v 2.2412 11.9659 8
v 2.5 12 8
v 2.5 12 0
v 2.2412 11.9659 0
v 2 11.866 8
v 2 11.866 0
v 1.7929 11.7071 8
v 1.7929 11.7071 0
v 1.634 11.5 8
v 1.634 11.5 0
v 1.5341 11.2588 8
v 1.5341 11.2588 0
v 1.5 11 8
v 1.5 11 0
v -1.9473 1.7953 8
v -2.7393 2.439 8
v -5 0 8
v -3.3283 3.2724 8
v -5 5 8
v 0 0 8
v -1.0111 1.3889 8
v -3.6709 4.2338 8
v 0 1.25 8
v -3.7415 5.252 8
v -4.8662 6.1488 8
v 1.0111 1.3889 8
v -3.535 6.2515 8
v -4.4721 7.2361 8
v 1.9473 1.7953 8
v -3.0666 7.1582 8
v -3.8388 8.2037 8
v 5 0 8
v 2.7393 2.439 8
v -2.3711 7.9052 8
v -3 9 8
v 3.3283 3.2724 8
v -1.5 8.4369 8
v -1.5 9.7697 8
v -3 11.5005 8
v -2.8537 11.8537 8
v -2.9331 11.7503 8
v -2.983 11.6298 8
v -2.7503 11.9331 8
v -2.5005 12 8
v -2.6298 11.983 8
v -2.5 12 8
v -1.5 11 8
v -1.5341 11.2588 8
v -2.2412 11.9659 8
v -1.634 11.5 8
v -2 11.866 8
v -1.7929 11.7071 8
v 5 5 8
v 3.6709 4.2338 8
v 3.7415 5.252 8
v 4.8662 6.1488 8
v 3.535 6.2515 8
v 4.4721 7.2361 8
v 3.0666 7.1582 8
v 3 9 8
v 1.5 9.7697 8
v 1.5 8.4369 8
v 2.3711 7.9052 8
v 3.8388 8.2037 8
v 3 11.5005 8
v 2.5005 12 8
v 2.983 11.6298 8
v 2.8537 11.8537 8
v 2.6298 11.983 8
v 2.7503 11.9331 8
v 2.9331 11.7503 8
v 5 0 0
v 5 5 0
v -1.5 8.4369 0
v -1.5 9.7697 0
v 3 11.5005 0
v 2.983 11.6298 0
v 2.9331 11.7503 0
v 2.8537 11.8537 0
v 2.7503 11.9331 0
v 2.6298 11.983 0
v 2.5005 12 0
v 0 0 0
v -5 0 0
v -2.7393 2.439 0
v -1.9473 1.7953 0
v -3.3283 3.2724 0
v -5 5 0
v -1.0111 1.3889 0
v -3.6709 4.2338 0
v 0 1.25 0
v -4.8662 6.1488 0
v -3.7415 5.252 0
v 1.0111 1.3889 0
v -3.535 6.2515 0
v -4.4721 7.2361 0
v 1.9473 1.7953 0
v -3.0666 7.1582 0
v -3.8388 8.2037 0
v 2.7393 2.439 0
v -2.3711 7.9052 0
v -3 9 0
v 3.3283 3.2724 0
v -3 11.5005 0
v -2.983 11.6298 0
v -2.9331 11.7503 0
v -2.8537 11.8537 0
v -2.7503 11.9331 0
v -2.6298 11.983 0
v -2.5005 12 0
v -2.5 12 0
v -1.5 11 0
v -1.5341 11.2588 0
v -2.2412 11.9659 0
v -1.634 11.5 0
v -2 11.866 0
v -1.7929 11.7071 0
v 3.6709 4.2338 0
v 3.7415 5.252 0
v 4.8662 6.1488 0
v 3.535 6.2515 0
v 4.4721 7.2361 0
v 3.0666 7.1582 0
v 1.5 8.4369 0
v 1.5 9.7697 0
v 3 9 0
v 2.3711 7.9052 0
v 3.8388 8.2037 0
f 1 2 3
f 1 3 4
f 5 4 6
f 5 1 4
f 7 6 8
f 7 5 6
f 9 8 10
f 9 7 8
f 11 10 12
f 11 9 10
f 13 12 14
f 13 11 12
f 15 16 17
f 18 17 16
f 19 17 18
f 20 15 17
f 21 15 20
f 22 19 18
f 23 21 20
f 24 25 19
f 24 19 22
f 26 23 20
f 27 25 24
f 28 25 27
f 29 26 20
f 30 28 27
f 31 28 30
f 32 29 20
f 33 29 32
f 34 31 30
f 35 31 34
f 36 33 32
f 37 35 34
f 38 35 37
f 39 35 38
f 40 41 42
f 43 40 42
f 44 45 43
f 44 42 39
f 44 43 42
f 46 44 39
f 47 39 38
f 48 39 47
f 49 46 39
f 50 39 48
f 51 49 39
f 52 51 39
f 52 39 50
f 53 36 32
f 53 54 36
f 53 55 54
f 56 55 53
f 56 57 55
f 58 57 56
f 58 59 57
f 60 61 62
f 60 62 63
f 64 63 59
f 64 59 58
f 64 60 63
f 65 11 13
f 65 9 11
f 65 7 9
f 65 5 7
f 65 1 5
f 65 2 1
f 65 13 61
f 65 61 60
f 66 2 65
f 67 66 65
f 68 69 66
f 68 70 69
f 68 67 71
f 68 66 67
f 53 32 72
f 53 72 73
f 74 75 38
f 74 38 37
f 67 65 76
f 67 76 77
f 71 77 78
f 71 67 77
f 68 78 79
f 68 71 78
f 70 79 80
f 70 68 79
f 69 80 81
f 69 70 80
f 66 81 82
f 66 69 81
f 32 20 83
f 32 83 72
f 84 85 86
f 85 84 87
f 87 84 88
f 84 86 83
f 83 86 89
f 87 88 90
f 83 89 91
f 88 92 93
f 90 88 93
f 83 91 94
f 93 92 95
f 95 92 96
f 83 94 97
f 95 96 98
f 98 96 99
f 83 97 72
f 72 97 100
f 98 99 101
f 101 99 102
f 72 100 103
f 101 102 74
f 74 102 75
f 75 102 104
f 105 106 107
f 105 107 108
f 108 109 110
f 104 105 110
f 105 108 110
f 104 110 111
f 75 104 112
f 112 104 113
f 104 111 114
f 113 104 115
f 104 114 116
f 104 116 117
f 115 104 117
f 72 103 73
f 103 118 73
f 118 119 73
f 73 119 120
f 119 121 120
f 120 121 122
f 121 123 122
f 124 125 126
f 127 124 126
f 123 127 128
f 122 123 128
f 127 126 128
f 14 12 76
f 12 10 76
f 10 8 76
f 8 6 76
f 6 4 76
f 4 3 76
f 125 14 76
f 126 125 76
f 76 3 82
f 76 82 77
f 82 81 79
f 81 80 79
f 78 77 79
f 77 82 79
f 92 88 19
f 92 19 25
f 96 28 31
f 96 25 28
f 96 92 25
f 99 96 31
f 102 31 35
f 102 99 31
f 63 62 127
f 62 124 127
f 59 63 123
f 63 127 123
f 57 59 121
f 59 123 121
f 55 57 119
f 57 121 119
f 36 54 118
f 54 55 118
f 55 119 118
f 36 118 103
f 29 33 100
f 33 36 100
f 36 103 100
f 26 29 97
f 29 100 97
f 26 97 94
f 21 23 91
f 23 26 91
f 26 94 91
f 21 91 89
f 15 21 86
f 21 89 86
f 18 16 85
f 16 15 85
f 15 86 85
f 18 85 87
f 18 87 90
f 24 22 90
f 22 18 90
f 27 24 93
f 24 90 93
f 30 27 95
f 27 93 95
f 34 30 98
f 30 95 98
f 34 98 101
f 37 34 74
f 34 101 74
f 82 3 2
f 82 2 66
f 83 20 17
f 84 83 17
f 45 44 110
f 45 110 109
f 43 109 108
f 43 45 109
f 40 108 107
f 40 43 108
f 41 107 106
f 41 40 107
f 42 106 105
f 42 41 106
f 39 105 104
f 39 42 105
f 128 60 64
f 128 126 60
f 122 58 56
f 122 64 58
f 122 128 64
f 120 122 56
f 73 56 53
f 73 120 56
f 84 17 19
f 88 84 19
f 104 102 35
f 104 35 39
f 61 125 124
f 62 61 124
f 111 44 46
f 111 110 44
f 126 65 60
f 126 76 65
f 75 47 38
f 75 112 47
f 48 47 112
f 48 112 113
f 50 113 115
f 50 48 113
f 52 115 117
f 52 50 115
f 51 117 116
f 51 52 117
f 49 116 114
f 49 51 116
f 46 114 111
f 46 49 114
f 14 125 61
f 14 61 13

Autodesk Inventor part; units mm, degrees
ref_plane "YZ Plane" through (0, 0, 0) normal (1, 0, 0) x (0, 1, 0)
ref_plane "XZ Plane" through (0, 0, 0) normal (0, 1, 0) x (-1, 0, 0)
ref_plane "XY Plane" through (0, 0, 0) normal (0, 0, 1) x (1, 0, 0)
sketch "Sketch3" plane through (0, 0, 0) normal (0, 0, 1) x (1, 0, 0)
  line L0 (0, 0) -> (-5, 0)
  line L1 (-5, 0) -> (-5, 5)
  line L2 (0, 0) -> (5, 0)
  line L3 (5, 0) -> (5, 5)
  arc A0 (-1.5, 8.4369) -> (1.5, 8.4369) centre (0, 5) ccw
  line L4 (-3, 9) -> (-3, 12)
  line L5 (-3, 12) -> (-1.5, 12)
  line L6 (-1.5, 12) -> (-1.5, 9.7697)
  line L7 (1.5, 9.7697) -> (1.5, 12)
  line L8 (1.5, 12) -> (3, 12)
  line L9 (3, 12) -> (3, 9)
  line L10 (-1.5, 9.7697) -> (-1.5, 8.4369)
  line L11 (1.5, 9.7697) -> (1.5, 8.4369)
  arc A1 (-3, 9) -> (-5, 5) centre (0, 5) ccw
  arc A2 (5, 5) -> (3, 9) centre (0, 5) ccw
  dimension "d9" = 5
  dimension "d10" = 7.5
  dimension "d11" = 3
  dimension "d12" = 7
  dimension "d13" = 1.5
  dimension "d14" = 5
  dimension "d15" = 5
  dimension "d16" = 1.5
extrude "Extrusion1" add sketch "Sketch3" along normal blind 8
fillet "Fillet1" radius 1 2 edges at (-1.5, 12, 4) (1.5, 12, 4)
fillet "Fillet2" radius 0.5 2 edges at (3, 12, 4) (-3, 12, 4)
properties part number "WireClip"
